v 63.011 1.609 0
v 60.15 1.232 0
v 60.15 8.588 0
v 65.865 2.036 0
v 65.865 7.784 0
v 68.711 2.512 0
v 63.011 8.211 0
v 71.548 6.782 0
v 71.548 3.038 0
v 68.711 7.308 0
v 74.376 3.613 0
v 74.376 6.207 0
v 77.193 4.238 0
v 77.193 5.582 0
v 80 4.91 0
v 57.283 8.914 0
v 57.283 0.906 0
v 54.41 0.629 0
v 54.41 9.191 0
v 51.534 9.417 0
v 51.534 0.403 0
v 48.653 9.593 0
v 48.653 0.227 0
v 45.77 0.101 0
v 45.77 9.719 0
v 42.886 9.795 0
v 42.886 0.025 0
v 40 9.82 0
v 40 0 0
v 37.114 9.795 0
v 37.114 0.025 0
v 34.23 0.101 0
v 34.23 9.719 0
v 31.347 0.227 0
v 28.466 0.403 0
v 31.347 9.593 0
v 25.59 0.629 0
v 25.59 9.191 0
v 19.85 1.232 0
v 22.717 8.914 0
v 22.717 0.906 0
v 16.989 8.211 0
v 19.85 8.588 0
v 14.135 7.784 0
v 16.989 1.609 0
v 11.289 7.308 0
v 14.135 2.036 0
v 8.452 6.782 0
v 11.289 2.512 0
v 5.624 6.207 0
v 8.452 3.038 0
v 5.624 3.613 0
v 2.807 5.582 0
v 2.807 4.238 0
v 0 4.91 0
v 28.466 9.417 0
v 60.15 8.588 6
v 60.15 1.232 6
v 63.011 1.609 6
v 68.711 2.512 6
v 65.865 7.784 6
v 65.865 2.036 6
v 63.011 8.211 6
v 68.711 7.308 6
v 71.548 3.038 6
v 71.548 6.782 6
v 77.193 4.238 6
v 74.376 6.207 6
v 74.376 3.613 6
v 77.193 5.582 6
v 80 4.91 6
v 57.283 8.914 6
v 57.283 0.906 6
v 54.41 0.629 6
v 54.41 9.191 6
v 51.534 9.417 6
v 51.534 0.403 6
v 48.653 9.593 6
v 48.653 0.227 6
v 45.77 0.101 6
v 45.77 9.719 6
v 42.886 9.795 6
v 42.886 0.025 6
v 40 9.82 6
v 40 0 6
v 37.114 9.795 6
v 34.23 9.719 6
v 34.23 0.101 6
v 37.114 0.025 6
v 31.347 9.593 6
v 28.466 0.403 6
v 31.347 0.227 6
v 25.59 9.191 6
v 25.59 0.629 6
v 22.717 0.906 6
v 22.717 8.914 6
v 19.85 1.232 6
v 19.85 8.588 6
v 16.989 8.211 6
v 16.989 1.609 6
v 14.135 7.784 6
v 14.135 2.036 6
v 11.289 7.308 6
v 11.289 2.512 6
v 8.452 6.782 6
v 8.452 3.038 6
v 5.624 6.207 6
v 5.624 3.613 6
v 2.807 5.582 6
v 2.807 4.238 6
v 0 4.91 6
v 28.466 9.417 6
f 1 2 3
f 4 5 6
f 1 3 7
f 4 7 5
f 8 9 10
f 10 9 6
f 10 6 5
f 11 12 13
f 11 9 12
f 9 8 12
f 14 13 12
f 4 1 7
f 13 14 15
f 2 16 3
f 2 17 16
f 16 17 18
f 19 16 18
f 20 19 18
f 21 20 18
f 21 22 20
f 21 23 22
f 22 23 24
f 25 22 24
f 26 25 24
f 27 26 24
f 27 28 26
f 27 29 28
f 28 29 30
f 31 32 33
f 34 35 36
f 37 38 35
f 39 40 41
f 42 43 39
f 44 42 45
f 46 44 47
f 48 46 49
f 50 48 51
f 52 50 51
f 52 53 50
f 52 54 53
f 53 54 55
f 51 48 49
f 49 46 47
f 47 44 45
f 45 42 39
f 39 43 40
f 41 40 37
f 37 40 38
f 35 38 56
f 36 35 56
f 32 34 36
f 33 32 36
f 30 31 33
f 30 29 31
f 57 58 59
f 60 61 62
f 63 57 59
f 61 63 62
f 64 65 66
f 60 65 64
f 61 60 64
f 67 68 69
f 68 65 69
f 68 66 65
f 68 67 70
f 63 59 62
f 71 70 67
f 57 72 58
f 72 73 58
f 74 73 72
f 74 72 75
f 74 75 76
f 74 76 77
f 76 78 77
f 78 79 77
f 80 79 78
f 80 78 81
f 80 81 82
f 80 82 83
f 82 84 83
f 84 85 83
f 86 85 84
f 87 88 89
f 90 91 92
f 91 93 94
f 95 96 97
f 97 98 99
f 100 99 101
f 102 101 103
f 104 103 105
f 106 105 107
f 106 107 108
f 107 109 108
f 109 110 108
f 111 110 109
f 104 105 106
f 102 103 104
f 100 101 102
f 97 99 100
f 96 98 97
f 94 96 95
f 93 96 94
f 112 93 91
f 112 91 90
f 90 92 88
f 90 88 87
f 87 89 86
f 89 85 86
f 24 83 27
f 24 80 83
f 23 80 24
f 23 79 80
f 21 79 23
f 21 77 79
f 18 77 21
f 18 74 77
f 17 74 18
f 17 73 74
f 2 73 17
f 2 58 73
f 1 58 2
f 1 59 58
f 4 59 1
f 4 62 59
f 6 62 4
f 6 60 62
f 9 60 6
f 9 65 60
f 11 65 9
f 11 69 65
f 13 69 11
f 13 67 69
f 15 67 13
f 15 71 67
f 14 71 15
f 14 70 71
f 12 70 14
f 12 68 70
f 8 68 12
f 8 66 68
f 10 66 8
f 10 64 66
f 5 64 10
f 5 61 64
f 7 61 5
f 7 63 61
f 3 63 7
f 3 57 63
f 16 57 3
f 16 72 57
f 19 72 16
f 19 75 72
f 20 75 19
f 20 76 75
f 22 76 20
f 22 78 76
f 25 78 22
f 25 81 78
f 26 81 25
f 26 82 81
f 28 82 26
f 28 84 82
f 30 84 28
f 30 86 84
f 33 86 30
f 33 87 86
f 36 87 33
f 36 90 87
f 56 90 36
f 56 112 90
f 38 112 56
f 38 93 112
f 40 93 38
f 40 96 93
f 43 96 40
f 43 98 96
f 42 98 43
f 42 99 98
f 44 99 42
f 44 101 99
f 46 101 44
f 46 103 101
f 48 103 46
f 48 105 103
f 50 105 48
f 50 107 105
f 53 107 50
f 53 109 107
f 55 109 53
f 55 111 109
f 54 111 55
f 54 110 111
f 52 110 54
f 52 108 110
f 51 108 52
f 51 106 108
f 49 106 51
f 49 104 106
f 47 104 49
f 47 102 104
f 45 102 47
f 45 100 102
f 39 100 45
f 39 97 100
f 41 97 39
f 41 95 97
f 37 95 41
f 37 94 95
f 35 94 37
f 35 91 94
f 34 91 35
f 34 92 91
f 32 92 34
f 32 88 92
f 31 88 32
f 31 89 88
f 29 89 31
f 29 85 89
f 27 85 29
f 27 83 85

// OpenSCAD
$fn = 32;

// ----------------------------------------------------------------------
// Arc profile plate: lens, 56 points
// ----------------------------------------------------------------------

// --- parameters (mm) ---
lens_chord = 80;          // chord length of the lens, X
arc_r = 165.34;           // radius of both arcs
arc_angle = 28;           // angle of each arc, degrees
sagitta = 4.91;           // bulge of each arc (half the lens height)
arc_step = 1;             // sampling step of the arcs, degrees
plate_t = 6;              // plate thickness, Z
fit_tol = 0.02;           // declared fit tolerance (prompt contract)
free_tol = 0.2;           // declared free tolerance (prompt contract)

bbox_y = 2 * sagitta;  // full lens height

profile = [[80, 4.91], [77.193, 5.582], [74.376, 6.207], [71.548, 6.782], [68.711, 7.308], [65.865, 7.784], [63.011, 8.211], [60.15, 8.588], [57.283, 8.914], [54.41, 9.191], [51.534, 9.417], [48.653, 9.593], [45.77, 9.719], [42.886, 9.795], [40, 9.82], [37.114, 9.795], [34.23, 9.719], [31.347, 9.593], [28.466, 9.417], [25.59, 9.191], [22.717, 8.914], [19.85, 8.588], [16.989, 8.211], [14.135, 7.784], [11.289, 7.308], [8.452, 6.782], [5.624, 6.207], [2.807, 5.582], [0, 4.91], [2.807, 4.238], [5.624, 3.613], [8.452, 3.038], [11.289, 2.512], [14.135, 2.036], [16.989, 1.609], [19.85, 1.232], [22.717, 0.906], [25.59, 0.629], [28.466, 0.403], [31.347, 0.227], [34.23, 0.101], [37.114, 0.025], [40, 0], [42.886, 0.025], [45.77, 0.101], [48.653, 0.227], [51.534, 0.403], [54.41, 0.629], [57.283, 0.906], [60.15, 1.232], [63.011, 1.609], [65.865, 2.036], [68.711, 2.512], [71.548, 3.038], [74.376, 3.613], [77.193, 4.238]];  // primary outline, 56 points, counter clockwise

// --- the one profile operation ---
linear_extrude(height = plate_t) polygon(points = profile);
